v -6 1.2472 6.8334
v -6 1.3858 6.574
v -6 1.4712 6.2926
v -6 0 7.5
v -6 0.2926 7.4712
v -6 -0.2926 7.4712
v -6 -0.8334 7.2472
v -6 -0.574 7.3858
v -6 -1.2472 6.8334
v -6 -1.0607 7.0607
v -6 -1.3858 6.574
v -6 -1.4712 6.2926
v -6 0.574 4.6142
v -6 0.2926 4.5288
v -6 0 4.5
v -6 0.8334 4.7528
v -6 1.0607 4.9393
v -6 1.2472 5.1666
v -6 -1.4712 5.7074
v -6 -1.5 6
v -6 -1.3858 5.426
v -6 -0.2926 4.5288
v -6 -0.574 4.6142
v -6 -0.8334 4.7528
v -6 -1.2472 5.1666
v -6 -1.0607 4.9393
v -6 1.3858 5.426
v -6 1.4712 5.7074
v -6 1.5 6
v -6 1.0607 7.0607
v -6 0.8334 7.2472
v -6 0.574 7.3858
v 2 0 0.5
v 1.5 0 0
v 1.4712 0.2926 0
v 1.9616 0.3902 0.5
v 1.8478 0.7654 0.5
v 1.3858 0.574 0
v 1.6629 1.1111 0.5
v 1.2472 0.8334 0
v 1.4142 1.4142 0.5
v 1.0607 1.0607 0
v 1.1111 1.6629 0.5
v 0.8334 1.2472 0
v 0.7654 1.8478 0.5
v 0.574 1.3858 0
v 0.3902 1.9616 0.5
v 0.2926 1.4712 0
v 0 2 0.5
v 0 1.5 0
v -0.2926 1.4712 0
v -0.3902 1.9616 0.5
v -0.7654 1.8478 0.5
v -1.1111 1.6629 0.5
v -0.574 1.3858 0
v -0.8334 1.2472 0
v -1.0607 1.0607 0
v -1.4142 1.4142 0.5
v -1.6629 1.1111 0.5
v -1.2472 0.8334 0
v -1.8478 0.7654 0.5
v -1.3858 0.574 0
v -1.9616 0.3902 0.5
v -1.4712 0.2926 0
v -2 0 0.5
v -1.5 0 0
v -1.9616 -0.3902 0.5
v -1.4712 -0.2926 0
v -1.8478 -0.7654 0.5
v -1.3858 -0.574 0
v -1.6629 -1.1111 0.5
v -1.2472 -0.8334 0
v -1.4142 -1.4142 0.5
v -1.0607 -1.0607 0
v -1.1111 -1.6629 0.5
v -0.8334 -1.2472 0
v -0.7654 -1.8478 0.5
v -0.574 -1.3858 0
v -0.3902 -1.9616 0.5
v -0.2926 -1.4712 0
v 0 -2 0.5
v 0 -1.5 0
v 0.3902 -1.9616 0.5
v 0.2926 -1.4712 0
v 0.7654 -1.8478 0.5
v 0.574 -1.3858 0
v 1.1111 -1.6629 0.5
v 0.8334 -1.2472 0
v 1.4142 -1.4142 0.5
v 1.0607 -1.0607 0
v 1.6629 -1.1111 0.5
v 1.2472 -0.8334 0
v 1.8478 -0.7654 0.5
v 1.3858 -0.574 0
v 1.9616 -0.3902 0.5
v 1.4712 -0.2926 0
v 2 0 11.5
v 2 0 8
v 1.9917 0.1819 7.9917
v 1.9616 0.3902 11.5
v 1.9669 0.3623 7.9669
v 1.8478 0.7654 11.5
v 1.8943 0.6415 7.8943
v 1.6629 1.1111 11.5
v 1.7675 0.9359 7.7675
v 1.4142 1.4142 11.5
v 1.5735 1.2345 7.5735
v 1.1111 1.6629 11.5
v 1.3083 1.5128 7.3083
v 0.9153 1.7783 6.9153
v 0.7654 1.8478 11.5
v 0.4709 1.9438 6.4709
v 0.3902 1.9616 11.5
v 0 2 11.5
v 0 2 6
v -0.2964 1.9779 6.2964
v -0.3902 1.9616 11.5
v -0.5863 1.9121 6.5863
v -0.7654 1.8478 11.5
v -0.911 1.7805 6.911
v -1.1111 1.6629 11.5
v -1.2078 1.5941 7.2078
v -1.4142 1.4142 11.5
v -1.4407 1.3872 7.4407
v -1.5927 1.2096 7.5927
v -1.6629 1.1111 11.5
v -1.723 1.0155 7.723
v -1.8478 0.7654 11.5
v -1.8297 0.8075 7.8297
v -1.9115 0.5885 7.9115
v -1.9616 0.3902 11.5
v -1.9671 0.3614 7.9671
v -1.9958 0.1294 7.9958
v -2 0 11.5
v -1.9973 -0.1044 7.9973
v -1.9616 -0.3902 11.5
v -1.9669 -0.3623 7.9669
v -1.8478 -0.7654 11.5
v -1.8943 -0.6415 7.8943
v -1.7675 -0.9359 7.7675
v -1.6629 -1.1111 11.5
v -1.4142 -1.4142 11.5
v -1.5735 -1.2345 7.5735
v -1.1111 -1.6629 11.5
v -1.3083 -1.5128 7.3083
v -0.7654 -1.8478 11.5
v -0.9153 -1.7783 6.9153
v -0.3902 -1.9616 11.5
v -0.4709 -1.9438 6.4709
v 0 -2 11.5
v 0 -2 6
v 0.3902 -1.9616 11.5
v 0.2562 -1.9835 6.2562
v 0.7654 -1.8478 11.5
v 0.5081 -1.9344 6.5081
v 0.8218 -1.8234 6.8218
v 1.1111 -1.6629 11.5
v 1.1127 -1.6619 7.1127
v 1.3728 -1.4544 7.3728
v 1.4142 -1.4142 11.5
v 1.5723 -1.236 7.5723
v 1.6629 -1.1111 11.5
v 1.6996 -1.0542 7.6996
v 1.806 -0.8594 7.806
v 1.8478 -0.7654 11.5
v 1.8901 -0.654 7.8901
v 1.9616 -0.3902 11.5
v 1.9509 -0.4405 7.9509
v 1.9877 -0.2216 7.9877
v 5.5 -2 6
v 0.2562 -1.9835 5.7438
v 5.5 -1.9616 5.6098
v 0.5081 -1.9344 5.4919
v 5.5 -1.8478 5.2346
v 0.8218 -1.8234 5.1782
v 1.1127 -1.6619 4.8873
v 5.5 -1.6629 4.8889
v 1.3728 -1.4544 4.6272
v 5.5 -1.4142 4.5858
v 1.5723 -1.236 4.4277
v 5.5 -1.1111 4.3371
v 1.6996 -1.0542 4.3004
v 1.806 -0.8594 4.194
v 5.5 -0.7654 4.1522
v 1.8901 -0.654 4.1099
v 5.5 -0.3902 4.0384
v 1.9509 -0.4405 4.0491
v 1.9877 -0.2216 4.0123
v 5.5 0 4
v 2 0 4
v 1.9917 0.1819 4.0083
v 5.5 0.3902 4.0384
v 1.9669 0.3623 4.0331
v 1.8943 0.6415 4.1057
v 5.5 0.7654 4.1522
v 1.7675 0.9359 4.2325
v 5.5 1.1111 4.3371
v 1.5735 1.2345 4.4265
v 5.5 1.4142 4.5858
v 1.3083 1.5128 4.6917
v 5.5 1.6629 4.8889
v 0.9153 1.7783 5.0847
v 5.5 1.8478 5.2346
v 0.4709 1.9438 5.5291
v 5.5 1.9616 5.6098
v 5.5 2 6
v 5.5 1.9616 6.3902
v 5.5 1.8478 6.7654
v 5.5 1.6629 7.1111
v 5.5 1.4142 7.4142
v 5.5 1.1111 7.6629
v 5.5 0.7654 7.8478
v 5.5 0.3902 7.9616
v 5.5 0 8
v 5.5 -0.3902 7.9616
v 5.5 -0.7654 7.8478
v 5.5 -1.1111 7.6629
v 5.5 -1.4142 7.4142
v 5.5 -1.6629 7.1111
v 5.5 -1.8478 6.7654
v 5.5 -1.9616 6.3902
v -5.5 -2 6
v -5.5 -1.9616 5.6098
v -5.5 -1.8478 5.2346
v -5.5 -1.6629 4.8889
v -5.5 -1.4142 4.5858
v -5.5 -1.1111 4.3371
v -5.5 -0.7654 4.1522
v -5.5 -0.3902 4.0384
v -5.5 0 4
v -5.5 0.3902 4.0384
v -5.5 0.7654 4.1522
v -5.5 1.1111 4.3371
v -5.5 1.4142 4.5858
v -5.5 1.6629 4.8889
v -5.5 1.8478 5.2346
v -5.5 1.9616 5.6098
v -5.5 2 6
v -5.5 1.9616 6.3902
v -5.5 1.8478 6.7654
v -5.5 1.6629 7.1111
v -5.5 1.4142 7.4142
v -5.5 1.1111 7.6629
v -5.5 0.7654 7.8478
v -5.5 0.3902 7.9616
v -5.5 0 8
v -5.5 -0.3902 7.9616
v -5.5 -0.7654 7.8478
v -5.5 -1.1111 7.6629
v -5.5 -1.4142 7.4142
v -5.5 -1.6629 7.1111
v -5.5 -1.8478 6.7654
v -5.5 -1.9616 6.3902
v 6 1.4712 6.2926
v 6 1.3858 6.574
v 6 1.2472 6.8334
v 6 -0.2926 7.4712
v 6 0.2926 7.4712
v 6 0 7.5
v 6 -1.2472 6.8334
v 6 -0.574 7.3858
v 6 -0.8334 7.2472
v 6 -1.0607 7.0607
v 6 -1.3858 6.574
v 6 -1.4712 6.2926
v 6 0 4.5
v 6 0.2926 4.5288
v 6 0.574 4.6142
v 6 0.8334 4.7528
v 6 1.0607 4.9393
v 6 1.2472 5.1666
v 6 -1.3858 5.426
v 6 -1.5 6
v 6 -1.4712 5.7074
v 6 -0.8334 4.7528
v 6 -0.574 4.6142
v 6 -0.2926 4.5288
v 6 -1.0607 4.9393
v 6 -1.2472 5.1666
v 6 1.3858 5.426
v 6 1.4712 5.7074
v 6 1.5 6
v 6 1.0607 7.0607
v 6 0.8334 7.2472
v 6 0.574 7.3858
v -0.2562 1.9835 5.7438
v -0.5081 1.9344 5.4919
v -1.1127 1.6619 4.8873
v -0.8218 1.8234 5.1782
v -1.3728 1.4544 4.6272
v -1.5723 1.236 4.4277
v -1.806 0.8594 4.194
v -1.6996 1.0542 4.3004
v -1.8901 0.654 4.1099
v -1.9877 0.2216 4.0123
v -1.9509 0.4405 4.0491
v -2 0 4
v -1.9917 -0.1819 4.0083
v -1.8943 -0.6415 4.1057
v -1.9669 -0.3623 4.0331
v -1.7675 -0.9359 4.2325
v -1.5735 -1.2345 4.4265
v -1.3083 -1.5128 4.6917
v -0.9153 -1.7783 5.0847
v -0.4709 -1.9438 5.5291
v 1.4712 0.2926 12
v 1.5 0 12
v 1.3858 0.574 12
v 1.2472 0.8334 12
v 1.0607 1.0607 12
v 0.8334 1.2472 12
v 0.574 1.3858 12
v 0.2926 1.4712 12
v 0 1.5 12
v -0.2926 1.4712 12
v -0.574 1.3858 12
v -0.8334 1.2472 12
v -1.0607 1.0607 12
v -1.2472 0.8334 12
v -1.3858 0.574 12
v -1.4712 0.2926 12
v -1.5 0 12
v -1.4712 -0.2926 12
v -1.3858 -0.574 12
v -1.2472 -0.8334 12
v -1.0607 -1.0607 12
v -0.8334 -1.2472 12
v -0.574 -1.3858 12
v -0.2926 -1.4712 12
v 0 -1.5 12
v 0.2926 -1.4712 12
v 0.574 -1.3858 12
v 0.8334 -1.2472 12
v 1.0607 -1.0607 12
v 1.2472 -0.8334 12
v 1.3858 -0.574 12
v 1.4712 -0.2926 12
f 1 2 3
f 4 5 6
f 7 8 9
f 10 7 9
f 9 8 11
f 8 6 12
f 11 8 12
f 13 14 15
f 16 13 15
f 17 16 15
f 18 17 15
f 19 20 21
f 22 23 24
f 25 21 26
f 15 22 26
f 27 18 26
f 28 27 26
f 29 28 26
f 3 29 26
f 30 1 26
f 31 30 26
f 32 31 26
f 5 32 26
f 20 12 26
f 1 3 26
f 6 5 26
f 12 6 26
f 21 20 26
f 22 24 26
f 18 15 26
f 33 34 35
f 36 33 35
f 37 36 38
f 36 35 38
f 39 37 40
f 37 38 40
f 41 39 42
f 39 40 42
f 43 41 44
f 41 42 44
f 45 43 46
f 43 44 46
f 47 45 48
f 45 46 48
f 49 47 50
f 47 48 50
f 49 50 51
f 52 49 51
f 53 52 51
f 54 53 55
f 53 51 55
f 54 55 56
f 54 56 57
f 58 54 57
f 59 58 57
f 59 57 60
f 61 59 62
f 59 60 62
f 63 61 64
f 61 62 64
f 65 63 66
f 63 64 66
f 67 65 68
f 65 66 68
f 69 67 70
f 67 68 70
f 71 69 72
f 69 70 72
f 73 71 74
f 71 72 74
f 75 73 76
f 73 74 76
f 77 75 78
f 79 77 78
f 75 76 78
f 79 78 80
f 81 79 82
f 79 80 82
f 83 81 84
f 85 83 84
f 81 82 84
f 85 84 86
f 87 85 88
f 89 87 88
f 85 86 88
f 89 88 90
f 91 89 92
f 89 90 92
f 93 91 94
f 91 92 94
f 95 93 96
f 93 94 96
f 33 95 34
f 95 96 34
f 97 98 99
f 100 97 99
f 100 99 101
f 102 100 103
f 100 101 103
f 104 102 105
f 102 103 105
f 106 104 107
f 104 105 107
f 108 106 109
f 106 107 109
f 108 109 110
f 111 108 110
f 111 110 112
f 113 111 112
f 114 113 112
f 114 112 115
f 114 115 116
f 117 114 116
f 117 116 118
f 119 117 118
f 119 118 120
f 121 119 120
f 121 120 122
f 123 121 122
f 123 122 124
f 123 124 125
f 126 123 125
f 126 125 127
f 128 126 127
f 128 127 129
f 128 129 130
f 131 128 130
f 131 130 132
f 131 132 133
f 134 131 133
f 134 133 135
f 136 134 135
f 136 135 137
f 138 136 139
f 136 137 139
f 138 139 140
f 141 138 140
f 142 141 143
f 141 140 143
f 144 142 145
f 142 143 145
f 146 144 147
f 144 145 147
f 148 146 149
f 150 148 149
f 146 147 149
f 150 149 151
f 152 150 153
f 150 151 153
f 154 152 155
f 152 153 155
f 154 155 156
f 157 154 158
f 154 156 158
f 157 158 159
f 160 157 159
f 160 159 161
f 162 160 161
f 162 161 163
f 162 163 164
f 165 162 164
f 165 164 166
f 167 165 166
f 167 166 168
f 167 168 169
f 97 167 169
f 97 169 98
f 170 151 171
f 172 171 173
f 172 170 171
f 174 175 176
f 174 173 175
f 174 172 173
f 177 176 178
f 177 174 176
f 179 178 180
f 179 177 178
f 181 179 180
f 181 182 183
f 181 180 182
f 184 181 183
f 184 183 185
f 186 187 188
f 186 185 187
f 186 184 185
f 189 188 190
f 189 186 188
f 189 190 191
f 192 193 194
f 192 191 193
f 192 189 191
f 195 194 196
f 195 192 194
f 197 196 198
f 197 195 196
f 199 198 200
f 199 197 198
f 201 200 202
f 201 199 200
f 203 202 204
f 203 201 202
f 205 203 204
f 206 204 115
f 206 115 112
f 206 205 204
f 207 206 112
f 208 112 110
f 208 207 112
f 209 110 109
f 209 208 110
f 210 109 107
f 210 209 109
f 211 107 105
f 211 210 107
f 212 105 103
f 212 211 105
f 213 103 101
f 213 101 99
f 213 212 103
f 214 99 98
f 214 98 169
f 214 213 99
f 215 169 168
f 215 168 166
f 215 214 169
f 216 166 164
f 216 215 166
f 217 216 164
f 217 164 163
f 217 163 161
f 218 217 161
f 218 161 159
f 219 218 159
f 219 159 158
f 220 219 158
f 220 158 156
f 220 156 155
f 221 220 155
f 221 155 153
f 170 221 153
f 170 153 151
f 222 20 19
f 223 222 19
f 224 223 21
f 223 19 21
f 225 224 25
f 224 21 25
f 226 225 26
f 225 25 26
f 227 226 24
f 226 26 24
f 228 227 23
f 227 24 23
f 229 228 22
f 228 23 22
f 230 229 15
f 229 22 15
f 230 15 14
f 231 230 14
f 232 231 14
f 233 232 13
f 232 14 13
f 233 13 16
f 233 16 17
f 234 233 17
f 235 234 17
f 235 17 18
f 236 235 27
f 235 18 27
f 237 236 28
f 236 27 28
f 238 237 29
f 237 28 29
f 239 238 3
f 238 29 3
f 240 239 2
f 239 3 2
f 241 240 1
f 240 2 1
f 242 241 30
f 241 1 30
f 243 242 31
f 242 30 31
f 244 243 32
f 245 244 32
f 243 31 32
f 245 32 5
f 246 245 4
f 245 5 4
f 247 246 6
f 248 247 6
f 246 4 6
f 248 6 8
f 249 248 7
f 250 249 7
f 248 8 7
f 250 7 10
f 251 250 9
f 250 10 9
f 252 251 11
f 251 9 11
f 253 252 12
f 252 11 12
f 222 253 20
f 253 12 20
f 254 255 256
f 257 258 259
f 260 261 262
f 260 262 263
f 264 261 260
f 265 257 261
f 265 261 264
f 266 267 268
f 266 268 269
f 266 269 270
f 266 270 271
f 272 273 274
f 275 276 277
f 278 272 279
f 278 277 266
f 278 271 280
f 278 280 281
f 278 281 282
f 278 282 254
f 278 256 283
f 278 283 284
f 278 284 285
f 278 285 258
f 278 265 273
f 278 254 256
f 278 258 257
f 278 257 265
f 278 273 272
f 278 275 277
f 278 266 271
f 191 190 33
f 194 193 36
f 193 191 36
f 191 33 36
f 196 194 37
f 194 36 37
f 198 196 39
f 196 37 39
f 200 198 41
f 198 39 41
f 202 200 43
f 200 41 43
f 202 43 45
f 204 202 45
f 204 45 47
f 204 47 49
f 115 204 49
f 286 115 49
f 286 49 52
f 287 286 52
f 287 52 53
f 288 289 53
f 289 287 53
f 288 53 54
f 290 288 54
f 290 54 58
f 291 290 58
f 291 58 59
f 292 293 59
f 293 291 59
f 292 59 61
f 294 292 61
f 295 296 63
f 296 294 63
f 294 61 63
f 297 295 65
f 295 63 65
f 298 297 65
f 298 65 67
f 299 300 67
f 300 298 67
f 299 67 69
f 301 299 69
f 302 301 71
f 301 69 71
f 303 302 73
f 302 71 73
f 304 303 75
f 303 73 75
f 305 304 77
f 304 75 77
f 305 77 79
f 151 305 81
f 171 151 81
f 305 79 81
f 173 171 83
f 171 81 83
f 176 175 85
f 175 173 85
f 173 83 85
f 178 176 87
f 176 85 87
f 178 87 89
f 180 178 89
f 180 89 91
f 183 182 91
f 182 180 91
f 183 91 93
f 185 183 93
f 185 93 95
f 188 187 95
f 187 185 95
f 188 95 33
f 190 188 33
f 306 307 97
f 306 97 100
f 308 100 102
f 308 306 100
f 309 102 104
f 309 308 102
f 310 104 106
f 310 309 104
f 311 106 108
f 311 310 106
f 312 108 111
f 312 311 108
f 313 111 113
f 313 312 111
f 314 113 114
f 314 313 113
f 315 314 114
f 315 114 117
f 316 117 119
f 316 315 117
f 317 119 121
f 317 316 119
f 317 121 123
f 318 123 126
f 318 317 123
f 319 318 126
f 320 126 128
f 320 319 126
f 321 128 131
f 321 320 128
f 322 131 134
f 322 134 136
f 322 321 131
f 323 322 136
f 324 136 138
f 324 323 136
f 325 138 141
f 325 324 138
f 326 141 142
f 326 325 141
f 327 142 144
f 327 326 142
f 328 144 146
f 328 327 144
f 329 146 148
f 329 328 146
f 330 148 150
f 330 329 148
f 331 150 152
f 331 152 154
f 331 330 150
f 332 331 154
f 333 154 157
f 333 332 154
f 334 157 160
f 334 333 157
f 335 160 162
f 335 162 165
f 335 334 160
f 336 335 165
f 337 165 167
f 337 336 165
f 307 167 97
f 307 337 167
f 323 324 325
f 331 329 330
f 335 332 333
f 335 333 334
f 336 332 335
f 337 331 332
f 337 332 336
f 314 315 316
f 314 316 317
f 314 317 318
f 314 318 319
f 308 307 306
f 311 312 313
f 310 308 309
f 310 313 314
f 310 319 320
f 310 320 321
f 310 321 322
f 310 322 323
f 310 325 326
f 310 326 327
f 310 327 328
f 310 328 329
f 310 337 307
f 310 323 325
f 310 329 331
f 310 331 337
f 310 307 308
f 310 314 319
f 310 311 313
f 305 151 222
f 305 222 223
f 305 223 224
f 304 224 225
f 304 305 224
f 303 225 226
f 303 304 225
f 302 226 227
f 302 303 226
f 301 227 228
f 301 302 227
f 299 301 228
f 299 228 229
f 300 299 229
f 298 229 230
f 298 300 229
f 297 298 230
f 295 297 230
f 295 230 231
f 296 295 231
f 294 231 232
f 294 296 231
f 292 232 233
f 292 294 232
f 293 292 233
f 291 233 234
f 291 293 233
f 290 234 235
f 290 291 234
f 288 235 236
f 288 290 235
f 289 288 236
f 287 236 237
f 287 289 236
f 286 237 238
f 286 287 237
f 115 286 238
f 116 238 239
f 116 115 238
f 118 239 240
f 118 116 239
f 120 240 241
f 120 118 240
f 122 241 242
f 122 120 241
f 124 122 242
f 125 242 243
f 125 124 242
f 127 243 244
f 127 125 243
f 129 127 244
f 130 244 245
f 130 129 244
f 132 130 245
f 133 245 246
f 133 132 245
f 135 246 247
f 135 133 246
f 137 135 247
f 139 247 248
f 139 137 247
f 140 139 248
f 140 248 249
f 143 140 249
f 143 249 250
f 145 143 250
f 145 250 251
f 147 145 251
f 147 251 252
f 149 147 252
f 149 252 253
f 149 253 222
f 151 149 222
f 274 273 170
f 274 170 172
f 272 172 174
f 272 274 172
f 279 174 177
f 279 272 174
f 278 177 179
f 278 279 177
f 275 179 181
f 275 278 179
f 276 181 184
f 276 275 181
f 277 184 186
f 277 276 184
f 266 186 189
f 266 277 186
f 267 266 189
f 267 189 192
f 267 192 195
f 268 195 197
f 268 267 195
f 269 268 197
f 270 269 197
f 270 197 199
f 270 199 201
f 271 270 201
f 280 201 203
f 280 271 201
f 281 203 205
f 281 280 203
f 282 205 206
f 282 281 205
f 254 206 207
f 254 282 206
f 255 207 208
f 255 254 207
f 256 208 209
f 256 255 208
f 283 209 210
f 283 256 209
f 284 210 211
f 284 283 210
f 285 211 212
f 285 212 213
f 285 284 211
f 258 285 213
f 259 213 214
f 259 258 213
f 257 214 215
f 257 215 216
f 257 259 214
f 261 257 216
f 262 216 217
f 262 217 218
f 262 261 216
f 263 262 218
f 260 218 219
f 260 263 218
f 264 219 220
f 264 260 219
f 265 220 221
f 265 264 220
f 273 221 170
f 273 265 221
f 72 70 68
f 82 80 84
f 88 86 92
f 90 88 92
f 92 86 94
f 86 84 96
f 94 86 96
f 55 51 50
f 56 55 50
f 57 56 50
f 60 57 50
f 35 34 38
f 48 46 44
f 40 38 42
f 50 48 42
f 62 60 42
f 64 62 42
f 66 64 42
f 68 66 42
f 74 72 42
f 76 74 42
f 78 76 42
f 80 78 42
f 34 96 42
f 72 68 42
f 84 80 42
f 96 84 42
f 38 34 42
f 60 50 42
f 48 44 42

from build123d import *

# Parameters (mm, degrees)
SKETCH1_R           = 2
BOSS_EXTRUDE1_DEPTH = 12
SKETCH3_R           = 2
BOSS_EXTRUDE2_DEPTH = 6
CHAMFER1_SIZE       = 0.5
CHAMFER2_SIZE       = 0.5


with BuildPart() as part:
    # Sketch1 → Boss-Extrude1 (new body)
    with BuildSketch(Plane.XY):
        Circle(SKETCH1_R)
    extrude(amount=BOSS_EXTRUDE1_DEPTH)

    # Sketch3 → Boss-Extrude2 (add, symmetric)
    with BuildSketch(Plane(origin=(0, 0, 0), x_dir=(0, 0, -1), z_dir=(1, 0, 0))):
        with Locations(Location((-6, 0, 0), (0, 0, 270))):
            Circle(SKETCH3_R)
    extrude(amount=BOSS_EXTRUDE2_DEPTH, both=True)

    # Chamfer1
    chamfer1_edges = [part.edges().sort_by_distance(p)[0] for p in [
        (6, 2, 6),
    ]]
    chamfer(chamfer1_edges, length=CHAMFER1_SIZE)

    # Chamfer2
    chamfer2_edges = [part.edges().sort_by_distance(p)[0] for p in [
        (-2, 0, 0),
        (-2, 0, 12),
        (-6, 2, 6),
    ]]
    chamfer(chamfer2_edges, length=CHAMFER2_SIZE)


solid = part.part
